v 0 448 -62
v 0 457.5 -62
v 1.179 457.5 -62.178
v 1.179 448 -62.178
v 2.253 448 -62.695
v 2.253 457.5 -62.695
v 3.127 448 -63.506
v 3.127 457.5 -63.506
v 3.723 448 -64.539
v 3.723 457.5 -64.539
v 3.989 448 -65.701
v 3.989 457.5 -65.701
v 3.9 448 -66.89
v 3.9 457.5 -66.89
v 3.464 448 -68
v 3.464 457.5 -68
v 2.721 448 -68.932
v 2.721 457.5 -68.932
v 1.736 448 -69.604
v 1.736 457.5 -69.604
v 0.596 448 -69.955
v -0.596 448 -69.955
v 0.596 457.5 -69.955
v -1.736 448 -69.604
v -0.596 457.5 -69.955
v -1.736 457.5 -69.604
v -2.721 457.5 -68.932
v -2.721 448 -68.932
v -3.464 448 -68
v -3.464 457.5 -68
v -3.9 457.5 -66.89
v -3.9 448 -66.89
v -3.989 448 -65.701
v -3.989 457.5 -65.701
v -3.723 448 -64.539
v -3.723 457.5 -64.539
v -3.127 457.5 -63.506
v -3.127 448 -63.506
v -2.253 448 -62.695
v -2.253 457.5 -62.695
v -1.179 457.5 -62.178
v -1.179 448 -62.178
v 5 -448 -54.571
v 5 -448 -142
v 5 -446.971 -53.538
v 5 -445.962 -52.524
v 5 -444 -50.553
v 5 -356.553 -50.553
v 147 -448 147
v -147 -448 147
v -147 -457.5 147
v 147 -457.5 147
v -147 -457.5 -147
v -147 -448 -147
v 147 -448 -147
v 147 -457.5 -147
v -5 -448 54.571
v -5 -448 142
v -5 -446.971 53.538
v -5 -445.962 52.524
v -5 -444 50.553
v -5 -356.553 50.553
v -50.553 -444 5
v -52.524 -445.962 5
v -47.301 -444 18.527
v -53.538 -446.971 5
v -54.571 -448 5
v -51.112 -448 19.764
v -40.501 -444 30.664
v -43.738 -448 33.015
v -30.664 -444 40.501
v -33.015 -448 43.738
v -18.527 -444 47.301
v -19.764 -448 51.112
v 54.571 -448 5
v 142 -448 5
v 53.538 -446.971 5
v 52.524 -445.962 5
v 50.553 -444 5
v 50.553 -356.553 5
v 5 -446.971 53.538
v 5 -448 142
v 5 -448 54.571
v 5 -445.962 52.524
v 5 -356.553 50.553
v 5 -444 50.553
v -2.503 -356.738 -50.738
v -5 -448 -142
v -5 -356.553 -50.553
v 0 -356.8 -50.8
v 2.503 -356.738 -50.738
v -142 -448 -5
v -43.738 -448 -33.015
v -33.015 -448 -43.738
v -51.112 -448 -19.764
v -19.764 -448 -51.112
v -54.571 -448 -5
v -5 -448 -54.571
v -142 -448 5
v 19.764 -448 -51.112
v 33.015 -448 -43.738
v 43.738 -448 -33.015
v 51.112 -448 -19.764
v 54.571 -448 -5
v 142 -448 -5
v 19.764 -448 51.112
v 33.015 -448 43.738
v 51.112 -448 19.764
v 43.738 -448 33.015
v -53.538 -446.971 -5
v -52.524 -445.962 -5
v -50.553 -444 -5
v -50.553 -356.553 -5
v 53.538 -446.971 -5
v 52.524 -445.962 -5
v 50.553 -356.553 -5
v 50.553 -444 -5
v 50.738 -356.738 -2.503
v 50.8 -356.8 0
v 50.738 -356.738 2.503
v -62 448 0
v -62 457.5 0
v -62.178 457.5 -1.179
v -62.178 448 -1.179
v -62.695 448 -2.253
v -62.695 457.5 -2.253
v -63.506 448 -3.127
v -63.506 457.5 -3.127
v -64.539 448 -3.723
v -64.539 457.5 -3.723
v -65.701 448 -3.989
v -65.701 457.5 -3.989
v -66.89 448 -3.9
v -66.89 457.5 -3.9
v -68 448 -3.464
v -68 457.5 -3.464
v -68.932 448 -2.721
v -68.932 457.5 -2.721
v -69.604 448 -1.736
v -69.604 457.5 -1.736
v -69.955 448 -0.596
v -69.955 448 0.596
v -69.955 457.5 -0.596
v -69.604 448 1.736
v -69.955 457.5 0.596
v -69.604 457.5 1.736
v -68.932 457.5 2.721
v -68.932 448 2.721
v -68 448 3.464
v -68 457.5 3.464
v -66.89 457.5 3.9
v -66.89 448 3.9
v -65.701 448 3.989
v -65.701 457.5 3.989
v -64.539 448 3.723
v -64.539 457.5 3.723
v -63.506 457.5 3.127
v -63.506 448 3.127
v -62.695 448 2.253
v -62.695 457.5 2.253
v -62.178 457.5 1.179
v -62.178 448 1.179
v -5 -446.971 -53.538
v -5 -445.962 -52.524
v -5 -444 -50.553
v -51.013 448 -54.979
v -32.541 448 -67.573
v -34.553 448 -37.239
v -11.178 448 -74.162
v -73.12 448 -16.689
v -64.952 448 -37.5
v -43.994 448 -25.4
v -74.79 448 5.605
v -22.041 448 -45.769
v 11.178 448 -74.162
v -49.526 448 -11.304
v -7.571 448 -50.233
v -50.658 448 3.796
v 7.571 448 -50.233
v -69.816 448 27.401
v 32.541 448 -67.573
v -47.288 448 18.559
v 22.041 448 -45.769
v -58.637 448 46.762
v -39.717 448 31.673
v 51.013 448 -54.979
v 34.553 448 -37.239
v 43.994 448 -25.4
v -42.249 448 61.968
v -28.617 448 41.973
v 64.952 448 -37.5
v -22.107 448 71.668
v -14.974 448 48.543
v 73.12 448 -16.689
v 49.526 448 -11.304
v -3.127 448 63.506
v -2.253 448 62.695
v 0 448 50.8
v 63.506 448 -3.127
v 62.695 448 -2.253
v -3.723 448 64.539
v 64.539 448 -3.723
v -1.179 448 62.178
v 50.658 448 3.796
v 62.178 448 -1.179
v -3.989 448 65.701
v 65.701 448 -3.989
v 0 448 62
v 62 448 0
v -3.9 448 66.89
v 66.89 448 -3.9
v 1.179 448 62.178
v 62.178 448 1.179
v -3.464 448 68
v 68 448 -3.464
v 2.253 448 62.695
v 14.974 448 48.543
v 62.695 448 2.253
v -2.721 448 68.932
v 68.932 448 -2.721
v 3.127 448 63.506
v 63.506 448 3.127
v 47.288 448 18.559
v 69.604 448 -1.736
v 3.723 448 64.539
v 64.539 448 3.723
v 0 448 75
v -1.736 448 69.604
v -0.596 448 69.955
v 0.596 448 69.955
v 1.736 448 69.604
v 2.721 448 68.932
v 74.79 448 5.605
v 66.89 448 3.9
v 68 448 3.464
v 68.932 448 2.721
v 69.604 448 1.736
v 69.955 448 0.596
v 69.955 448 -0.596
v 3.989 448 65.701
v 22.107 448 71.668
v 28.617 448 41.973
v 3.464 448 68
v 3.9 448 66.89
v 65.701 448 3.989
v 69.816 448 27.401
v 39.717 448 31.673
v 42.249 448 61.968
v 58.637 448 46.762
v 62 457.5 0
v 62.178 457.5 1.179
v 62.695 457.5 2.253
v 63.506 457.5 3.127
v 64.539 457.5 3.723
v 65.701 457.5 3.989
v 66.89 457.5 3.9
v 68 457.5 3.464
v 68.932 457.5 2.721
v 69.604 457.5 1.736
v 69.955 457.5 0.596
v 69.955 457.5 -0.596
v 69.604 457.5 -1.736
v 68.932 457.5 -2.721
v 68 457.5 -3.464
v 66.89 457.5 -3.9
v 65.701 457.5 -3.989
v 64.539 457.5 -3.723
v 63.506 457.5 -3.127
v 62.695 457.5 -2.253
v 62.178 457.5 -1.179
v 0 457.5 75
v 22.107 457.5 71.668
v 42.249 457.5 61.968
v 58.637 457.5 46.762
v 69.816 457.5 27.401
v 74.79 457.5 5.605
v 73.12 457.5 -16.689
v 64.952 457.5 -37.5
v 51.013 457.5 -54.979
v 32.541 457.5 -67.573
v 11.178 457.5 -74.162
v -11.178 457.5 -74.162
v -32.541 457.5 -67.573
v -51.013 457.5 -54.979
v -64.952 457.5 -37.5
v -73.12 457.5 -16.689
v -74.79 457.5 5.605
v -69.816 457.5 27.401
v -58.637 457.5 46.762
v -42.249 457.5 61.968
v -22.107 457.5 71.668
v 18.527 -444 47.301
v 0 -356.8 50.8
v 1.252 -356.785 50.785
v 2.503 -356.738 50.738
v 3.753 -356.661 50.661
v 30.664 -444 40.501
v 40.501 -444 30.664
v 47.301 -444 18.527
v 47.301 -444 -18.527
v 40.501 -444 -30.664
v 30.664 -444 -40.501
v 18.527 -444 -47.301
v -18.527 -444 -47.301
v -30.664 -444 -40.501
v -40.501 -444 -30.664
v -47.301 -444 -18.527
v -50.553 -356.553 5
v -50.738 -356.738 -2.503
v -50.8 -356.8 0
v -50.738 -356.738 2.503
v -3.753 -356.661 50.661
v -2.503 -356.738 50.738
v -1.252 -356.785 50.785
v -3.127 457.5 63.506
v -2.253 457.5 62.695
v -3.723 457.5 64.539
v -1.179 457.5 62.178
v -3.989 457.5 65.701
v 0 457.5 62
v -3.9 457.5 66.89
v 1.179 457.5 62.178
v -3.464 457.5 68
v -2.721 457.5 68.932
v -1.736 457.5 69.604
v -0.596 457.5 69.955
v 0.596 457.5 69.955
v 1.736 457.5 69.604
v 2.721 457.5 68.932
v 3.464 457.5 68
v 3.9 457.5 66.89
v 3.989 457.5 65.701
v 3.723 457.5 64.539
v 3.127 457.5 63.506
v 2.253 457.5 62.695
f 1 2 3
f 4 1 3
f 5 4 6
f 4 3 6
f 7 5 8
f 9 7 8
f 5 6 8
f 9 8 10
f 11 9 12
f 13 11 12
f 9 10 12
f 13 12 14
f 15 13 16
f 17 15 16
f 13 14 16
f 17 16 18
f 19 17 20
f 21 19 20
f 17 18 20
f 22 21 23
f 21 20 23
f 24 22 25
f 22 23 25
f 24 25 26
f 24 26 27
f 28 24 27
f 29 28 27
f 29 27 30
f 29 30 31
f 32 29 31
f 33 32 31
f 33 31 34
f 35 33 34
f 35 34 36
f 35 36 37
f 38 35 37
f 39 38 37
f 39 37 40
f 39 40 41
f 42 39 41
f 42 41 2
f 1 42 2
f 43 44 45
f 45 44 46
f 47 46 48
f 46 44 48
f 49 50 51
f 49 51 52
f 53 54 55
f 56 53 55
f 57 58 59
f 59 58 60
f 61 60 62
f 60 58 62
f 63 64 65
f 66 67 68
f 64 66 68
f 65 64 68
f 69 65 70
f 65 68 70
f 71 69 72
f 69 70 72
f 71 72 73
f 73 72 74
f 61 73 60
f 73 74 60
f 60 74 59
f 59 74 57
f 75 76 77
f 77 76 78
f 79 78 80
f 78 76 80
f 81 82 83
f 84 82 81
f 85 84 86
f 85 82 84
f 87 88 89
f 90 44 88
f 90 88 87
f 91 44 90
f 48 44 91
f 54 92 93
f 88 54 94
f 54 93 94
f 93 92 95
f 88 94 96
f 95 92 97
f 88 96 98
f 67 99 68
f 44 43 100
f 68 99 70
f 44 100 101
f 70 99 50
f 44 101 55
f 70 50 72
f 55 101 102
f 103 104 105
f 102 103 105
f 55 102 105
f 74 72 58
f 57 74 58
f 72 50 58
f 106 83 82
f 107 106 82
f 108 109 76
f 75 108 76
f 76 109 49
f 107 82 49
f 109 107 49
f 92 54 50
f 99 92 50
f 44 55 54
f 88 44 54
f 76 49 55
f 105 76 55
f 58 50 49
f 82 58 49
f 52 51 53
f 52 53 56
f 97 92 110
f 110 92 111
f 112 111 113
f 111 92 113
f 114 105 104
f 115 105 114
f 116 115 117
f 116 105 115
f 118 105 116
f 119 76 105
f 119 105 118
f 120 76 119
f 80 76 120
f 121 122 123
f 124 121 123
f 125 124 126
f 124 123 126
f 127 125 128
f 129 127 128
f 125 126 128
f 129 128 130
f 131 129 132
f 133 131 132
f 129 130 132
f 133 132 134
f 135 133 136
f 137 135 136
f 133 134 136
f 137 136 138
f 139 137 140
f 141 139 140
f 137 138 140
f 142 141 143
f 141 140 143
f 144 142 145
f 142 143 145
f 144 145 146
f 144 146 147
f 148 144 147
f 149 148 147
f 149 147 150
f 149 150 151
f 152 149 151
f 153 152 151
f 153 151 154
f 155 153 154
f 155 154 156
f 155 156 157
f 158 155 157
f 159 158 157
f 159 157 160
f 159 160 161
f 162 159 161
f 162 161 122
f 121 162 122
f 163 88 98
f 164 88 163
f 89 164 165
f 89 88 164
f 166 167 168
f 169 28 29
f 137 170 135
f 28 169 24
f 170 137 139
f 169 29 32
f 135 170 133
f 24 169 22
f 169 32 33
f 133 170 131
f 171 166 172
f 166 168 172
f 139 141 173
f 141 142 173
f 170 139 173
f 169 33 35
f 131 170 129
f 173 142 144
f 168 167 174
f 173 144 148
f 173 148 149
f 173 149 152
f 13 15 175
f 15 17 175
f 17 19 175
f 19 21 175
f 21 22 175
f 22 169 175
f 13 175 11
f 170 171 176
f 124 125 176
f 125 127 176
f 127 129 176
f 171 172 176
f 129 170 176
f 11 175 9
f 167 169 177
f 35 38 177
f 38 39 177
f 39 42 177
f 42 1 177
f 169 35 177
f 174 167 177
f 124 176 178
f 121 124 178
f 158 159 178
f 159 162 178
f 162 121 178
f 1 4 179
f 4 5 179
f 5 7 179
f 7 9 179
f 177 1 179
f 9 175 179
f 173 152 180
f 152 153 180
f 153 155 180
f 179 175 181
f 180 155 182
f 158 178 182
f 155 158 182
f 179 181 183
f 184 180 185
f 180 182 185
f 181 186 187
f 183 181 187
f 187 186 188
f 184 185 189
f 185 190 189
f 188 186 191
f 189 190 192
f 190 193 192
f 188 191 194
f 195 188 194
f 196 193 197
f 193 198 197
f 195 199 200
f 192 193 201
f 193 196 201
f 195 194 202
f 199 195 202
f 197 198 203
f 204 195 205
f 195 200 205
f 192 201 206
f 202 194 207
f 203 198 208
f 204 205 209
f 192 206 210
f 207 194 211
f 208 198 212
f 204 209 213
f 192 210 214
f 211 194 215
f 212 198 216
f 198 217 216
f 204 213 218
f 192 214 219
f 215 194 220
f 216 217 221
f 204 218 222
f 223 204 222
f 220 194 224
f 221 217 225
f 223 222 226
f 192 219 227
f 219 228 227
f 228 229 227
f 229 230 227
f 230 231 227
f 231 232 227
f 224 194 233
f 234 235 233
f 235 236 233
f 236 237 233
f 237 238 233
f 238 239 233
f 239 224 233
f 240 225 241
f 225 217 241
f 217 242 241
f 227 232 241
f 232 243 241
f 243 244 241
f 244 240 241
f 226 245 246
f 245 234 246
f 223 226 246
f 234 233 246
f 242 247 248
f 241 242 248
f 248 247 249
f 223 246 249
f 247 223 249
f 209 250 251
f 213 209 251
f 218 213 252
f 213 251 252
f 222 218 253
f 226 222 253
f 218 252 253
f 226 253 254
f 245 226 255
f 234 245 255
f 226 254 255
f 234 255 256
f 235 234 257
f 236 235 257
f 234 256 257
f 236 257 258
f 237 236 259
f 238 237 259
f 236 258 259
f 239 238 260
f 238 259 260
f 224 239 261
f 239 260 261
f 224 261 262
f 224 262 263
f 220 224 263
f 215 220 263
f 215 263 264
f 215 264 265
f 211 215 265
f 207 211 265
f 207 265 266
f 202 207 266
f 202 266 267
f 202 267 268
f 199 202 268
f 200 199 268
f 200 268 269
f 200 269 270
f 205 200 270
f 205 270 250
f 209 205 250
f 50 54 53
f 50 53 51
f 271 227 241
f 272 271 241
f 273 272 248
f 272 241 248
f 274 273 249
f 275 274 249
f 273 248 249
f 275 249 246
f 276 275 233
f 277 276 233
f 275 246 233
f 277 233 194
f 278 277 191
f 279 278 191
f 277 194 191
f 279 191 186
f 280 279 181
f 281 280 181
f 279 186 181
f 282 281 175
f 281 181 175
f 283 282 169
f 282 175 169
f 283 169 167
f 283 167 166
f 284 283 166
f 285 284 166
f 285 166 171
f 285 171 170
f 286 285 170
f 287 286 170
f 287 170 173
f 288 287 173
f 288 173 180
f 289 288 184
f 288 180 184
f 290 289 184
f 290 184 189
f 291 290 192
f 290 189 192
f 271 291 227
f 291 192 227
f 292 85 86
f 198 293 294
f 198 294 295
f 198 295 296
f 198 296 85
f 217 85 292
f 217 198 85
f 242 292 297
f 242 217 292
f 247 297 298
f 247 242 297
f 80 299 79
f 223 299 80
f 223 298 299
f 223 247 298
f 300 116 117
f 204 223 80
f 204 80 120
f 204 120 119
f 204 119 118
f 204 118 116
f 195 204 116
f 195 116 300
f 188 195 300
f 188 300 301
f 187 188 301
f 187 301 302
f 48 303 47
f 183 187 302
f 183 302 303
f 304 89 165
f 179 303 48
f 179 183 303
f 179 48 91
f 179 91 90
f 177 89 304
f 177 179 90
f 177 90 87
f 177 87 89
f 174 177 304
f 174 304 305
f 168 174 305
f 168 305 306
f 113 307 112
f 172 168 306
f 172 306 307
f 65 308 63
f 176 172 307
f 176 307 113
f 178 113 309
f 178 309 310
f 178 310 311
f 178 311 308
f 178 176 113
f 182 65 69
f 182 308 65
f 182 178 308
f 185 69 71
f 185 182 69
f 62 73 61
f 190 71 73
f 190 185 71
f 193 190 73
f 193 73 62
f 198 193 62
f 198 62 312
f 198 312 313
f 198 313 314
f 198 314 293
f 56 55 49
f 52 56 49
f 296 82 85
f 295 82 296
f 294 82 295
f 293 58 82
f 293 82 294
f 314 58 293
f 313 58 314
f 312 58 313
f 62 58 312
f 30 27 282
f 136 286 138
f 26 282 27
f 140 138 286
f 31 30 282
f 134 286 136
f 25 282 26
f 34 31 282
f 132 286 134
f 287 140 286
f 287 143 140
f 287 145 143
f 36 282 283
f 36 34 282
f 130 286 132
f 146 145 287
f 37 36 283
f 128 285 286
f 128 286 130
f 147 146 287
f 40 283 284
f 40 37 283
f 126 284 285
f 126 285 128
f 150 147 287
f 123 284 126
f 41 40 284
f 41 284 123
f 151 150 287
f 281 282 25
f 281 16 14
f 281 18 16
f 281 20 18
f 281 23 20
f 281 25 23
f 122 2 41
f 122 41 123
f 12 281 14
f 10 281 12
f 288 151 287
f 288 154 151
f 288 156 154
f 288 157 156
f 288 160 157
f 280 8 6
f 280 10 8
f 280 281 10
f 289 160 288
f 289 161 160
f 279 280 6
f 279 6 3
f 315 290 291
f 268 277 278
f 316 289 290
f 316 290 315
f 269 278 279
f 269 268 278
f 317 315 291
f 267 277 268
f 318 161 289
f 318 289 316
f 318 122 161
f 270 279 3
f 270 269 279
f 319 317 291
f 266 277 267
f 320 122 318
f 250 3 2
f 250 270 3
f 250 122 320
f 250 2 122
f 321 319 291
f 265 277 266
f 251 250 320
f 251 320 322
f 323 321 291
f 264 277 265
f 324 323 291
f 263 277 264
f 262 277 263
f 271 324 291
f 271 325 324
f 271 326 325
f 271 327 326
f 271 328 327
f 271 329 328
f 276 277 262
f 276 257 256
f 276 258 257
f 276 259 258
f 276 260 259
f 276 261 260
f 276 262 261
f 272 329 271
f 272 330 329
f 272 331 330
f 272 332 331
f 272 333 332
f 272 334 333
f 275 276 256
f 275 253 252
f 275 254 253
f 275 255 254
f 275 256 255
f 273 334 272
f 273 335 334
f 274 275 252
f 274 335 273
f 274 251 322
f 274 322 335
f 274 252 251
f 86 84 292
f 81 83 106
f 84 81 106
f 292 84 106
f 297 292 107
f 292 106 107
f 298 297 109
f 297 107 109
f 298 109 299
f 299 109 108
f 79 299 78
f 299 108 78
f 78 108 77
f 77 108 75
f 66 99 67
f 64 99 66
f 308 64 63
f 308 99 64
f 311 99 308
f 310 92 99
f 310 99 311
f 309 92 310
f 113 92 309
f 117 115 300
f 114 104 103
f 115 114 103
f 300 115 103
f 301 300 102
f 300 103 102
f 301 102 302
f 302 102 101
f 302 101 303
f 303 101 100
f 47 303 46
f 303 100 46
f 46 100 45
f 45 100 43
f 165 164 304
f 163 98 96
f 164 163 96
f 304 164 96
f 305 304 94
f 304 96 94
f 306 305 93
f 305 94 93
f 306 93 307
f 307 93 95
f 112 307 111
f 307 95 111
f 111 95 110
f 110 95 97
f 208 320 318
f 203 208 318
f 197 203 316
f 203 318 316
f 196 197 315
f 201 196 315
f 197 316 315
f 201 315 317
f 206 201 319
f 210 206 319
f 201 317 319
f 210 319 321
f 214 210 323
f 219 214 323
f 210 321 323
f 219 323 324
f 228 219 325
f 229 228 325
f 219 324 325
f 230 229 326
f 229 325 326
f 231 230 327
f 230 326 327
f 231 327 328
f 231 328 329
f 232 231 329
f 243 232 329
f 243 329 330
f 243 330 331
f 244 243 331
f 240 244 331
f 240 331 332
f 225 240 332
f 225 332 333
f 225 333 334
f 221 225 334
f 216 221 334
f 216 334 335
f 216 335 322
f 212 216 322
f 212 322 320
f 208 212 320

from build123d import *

# Parameters (mm, degrees)
CROQUIS1_R              = 50.8
SALIENTE_EXTRUIR1_DEPTH = 448
CROQUIS2_W              = 294
CROQUIS2_H              = 294
SALIENTE_EXTRUIR2_DEPTH = 9.5
CROQUIS3_R              = 75
SALIENTE_EXTRUIR3_DEPTH = 9.5
CORTAR_EXTRUIR1_REACH   = 940.319
CROQUIS4_R              = 4
MATRIZC1_COUNT          = 4
CHAFL_N1_SIZE           = 4
NERVIO2_REACH           = 504.518
CROQUIS5_WALL_W         = 1136.012097146
CROQUIS5_WALL_H         = 10
MATRIZC2_COUNT          = 4


with BuildPart() as part:
    # Croquis1 → Saliente-Extruir1 (new, symmetric)
    with BuildSketch(Plane(origin=(0, 0, 0), x_dir=(1, 0, 0), z_dir=(0, 1, 0))):
        with Locations(Location((0, 0, 0), (0, 0, 270))):
            Circle(CROQUIS1_R)
    extrude(amount=SALIENTE_EXTRUIR1_DEPTH, both=True)

    # Croquis2 → Saliente-Extruir2 (add)
    with BuildSketch(Plane.XZ.offset(448)):
        Rectangle(CROQUIS2_W, CROQUIS2_H)
    extrude(amount=SALIENTE_EXTRUIR2_DEPTH)

    # Croquis3 → Saliente-Extruir3 (add)
    with BuildSketch(Plane(origin=(0, 448, 0), x_dir=(1, 0, 0), z_dir=(0, 1, 0))):
        with Locations(Location((0, 0, 0), (0, 0, 270))):
            Circle(CROQUIS3_R)
    extrude(amount=SALIENTE_EXTRUIR3_DEPTH)

    # Croquis4 → Cortar-Extruir1 (cut, up to next)
    with BuildSketch(Plane(origin=(0, 457.5, 0), x_dir=(1, 0, 0), z_dir=(0, 1, 0)), mode=Mode.PRIVATE) as cortar_extruir1_sk1:
        with Locations(Location((0, 66, 0), (0, 0, 270))):
            Circle(CROQUIS4_R)
    cortar_extruir1_tool1 = extrude(cortar_extruir1_sk1.sketch, amount=-CORTAR_EXTRUIR1_REACH, mode=Mode.PRIVATE) & part.part
    cortar_extruir1 = cortar_extruir1_tool1.solids().sort_by_distance((0, 457.5, -66))[0]
    add(cortar_extruir1, mode=Mode.SUBTRACT)

    # MatrizC1: Cortar-Extruir1 ×4 about axis
    matrizc1_axis = Axis((0, 0, 0), (0, 1, 0))
    for i in range(1, MATRIZC1_COUNT):
        add(cortar_extruir1.rotate(matrizc1_axis, i * 360 / MATRIZC1_COUNT), mode=Mode.SUBTRACT)

    # Chaflán1
    chafl_n1_edges = [part.edges().sort_by_distance(p)[0] for p in [
        (0, -448, -50.8),
    ]]
    chamfer(chafl_n1_edges, length=CHAFL_N1_SIZE)

    # Croquis5 wall → Nervio2 (add, up to next)
    with BuildSketch(Plane(origin=(-96.4, -402.4, 0), x_dir=(0.707106781187, 0.707106781187, 0), z_dir=(-0.707106781187, 0.707106781187, 0)), mode=Mode.PRIVATE) as nervio2_sk1:
        Rectangle(CROQUIS5_WALL_W, CROQUIS5_WALL_H)
    nervio2_tool1 = extrude(nervio2_sk1.sketch, amount=-NERVIO2_REACH, mode=Mode.PRIVATE) - part.part
    nervio2 = nervio2_tool1.solids().sort_by_distance((-96.4, -402.4, 0))[0]
    add(nervio2)

    # MatrizC2: Nervio2 ×4 about axis
    matrizc2_axis = Axis((0, 0, 0), (0, 1, 0))
    for i in range(1, MATRIZC2_COUNT):
        add(nervio2.rotate(matrizc2_axis, i * 360 / MATRIZC2_COUNT))


solid = part.part
